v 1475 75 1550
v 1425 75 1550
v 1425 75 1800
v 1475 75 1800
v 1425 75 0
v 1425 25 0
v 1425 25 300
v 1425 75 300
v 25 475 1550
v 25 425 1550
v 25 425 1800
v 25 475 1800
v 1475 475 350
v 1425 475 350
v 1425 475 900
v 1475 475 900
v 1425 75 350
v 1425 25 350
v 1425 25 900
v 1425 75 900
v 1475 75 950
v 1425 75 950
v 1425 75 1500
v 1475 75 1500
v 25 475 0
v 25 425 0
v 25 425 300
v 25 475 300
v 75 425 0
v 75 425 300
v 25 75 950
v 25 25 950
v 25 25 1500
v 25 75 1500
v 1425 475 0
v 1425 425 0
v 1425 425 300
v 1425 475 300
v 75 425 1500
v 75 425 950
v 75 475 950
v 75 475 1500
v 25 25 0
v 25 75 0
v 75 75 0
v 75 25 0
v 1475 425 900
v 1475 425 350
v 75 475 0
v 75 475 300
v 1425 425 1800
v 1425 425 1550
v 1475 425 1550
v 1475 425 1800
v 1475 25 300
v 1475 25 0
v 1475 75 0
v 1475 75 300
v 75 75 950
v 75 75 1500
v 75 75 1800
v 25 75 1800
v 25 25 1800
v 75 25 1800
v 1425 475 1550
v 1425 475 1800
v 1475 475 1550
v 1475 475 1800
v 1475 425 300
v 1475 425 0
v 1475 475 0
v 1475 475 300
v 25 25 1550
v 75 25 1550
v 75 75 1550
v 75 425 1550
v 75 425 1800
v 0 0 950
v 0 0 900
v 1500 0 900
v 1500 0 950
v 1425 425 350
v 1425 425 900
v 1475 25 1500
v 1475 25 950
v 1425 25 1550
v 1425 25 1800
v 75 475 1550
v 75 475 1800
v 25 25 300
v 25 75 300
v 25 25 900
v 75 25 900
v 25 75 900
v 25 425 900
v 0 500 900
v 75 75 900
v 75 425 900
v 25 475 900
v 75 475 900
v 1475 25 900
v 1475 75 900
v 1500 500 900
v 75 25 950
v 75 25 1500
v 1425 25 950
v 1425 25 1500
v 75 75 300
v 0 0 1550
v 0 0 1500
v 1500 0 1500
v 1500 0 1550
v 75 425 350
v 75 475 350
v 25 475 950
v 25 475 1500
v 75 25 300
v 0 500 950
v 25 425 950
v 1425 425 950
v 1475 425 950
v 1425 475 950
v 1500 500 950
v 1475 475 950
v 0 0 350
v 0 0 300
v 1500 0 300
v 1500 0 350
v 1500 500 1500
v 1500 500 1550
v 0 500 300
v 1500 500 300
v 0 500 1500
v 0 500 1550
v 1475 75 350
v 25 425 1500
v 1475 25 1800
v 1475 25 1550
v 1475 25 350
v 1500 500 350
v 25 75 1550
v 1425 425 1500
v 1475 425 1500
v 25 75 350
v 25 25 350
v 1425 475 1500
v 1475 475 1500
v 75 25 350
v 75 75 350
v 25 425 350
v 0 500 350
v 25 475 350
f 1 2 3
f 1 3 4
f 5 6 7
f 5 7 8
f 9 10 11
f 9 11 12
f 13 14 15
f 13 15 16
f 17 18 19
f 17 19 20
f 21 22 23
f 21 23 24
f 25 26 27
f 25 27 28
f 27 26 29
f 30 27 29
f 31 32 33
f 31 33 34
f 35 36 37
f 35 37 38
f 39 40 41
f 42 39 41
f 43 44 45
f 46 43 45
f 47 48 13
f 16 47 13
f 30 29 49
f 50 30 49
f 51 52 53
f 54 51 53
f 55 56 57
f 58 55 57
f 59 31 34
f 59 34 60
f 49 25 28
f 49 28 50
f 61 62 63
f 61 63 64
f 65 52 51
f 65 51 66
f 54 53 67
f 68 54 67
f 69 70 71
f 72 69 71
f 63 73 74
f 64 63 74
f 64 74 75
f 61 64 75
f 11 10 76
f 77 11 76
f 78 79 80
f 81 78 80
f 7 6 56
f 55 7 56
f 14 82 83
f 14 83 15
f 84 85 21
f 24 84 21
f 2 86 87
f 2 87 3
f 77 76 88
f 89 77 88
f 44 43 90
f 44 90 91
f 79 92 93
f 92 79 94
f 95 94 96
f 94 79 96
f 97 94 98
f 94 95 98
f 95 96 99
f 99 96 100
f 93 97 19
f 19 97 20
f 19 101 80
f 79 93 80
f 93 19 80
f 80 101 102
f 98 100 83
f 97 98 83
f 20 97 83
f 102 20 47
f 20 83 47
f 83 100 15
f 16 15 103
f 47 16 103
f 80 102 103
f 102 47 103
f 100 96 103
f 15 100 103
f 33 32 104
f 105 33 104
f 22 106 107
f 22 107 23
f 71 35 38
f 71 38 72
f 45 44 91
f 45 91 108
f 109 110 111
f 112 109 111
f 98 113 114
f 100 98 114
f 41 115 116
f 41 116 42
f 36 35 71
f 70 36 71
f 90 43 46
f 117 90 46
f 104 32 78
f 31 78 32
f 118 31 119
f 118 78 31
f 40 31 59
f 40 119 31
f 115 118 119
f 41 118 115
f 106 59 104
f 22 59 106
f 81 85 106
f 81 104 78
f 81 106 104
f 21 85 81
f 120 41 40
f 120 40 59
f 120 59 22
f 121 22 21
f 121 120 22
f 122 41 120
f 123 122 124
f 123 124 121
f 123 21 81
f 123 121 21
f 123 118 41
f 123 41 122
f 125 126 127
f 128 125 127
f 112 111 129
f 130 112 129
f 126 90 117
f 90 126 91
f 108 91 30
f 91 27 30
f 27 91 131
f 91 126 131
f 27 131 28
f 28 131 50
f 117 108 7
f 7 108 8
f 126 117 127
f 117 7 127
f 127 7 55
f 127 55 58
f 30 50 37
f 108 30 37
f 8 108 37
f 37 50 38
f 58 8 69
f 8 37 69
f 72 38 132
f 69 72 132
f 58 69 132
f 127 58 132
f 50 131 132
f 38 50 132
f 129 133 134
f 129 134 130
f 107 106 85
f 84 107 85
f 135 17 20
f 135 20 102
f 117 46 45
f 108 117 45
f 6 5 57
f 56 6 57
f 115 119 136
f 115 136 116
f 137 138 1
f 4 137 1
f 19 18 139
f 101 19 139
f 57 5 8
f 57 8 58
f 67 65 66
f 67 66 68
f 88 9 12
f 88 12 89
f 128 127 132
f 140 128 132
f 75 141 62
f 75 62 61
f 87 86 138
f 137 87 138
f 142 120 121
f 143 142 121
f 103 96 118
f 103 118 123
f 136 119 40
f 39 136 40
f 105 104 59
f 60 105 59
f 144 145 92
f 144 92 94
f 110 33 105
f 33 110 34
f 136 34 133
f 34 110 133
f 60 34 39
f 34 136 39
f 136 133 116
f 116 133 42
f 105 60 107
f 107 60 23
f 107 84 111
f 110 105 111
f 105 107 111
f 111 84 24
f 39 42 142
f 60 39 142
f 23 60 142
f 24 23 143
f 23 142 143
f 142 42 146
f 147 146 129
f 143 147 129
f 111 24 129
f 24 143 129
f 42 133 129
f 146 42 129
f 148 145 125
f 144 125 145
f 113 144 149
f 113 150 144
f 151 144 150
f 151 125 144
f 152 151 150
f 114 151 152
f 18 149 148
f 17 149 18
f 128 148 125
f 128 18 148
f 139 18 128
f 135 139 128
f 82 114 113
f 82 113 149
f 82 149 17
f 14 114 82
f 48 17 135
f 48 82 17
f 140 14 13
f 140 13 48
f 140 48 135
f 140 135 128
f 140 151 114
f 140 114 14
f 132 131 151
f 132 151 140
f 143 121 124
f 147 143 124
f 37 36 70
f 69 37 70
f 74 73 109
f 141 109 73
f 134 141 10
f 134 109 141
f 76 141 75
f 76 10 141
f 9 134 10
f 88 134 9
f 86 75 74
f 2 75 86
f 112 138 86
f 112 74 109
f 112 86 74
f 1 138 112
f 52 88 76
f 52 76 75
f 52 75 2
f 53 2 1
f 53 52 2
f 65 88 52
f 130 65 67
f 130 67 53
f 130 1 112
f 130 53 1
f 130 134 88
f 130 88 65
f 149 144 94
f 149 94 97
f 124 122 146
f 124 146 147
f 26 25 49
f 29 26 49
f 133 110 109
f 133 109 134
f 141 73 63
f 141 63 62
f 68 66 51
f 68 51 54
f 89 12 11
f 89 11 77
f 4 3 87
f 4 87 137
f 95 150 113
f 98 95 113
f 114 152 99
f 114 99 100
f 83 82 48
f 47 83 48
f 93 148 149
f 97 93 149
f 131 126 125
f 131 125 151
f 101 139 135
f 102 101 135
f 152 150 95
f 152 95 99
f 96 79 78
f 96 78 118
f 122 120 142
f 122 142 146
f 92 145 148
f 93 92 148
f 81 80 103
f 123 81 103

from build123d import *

# Parameters (mm, degrees)
F1_W      = 1500
F1_H      = 500
F2_DEPTH  = 50
F3_W      = 50
F3_H      = 50
F4_DEPTH  = 1800
F6_W      = 1500
F6_H      = 500
F7_DEPTH  = 50
F9_W      = 1500
F9_H      = 500
F10_DEPTH = 50


with BuildPart() as f2:
    # F1 (on offset) → F2 (new body)
    with BuildSketch(Plane.XY.offset(300)):
        with Locations((750, 250)):
            Rectangle(F1_W, F1_H)
    extrude(amount=F2_DEPTH)

    # F3 (on Top) → F4 (join)
    with BuildSketch(Plane.XY):
        with Locations((50, 50)):
            Rectangle(F3_W, F3_H)
        with Locations((1450, 50)):
            Rectangle(F3_W, F3_H)
        with Locations((1450, 450)):
            Rectangle(F3_W, F3_H)
        with Locations((50, 450)):
            Rectangle(F3_W, F3_H)
    extrude(amount=F4_DEPTH)

    # F6 (on offset) → F7 (join)
    with BuildSketch(Plane.XY.offset(900)):
        with Locations((750, 250)):
            Rectangle(F6_W, F6_H)
    extrude(amount=F7_DEPTH)

    # F9 (on offset) → F10 (join)
    with BuildSketch(Plane.XY.offset(1500)):
        with Locations((750, 250)):
            Rectangle(F9_W, F9_H)
    extrude(amount=F10_DEPTH)


solid = f2.part
